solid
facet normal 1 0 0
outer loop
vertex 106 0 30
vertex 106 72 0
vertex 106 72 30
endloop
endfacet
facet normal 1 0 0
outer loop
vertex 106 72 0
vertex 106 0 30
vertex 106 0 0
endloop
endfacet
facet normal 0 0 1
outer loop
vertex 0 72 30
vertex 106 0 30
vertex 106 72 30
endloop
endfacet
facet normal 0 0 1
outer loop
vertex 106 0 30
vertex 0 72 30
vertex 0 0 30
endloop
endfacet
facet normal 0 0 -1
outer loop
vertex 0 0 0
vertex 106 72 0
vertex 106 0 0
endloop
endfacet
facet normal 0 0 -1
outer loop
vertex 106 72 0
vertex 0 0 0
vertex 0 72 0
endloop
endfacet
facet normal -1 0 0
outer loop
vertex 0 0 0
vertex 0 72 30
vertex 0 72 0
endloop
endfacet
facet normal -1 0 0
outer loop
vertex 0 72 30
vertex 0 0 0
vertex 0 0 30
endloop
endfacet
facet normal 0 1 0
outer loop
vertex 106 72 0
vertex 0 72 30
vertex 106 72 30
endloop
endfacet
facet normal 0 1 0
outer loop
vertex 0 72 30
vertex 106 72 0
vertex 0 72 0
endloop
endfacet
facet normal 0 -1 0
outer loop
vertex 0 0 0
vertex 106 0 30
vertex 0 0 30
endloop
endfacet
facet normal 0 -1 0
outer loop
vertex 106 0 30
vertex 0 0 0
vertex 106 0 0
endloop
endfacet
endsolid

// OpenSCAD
// Bench Rack for 1.5 mL Microcentrifuge Tubes
// Designed for FDM 3D printing. Rests on XY plane at Z=0.

// --- Dimensions (mm) ---
// Block Dimensions
$block_length = 106; // X
$block_width  = 72;  // Y
$block_height = 30;  // Z

// Grid Configuration
$grid_rows = 4;      // Rows along Y
$grid_cols = 6;      // Columns along X
$grid_spacing_x = 16; // Centre-to-centre spacing X
$grid_spacing_y = 16; // Centre-to-centre spacing Y

// Hole Dimensions
$hole_diameter = 11.2;
$hole_depth    = 25; // Depth of the hole (from top surface)
$floor_height  = 5;  // Solid floor thickness (30 - 25)

// --- Variables ---
$fn = 64; // Resolution for curved shapes

// --- Main Module ---
module bench_rack() {
    // Calculate the offset to center the grid on the block
    // Center of block is (0,0). 
    // We want the first hole at x = -((cols-1)*spacing)/2
    
    $x_offset = -(($grid_cols - 1) * $grid_spacing_x / 2);
    $y_offset = -(($grid_rows - 1) * $grid_spacing_y / 2);

    // Create the holes by subtracting cylinders from the block
    // We use a loop to generate all holes
    for (col = [0 : $grid_cols - 1]) {
        for (row = [0 : $grid_rows - 1]) {
            
            // Calculate position of the hole center relative to block center
            $x_pos = $x_offset + (col * $grid_spacing_x);
            $y_pos = $y_offset + (row * $grid_spacing_y);
            
            // Define the hole geometry
            // We subtract a cylinder that is slightly larger than the hole diameter
            // to ensure clean cutting (Rule 5).
            $cut_diameter = $hole_diameter + 0.1; 
            $cut_radius = $cut_diameter / 2;
            
            // The hole is open at the top (Z = $block_height) and goes down to Z = $floor_height
            // In OpenSCAD, cylinder height is along Z by default.
            // We position the cylinder so its top is at the block top.
            $z_pos = $block_height / 2; // Center of cylinder Z
            
            difference() {
                // Start with the solid block
                translate([0, 0, 0]) 
                    cube([
                        $block_length,
                        $block_width,
                        $block_height
                    ]);
                
                // Subtract the hole
                translate([
                    $x_pos, 
                    $y_pos, 
                    $z_pos
                ]) 
                    cylinder(
                        h = $hole_depth,
                        r = $cut_radius,
                        $fn = $fn
                    );
            }
        }
    }
}

// Instantiate the part
bench_rack();
